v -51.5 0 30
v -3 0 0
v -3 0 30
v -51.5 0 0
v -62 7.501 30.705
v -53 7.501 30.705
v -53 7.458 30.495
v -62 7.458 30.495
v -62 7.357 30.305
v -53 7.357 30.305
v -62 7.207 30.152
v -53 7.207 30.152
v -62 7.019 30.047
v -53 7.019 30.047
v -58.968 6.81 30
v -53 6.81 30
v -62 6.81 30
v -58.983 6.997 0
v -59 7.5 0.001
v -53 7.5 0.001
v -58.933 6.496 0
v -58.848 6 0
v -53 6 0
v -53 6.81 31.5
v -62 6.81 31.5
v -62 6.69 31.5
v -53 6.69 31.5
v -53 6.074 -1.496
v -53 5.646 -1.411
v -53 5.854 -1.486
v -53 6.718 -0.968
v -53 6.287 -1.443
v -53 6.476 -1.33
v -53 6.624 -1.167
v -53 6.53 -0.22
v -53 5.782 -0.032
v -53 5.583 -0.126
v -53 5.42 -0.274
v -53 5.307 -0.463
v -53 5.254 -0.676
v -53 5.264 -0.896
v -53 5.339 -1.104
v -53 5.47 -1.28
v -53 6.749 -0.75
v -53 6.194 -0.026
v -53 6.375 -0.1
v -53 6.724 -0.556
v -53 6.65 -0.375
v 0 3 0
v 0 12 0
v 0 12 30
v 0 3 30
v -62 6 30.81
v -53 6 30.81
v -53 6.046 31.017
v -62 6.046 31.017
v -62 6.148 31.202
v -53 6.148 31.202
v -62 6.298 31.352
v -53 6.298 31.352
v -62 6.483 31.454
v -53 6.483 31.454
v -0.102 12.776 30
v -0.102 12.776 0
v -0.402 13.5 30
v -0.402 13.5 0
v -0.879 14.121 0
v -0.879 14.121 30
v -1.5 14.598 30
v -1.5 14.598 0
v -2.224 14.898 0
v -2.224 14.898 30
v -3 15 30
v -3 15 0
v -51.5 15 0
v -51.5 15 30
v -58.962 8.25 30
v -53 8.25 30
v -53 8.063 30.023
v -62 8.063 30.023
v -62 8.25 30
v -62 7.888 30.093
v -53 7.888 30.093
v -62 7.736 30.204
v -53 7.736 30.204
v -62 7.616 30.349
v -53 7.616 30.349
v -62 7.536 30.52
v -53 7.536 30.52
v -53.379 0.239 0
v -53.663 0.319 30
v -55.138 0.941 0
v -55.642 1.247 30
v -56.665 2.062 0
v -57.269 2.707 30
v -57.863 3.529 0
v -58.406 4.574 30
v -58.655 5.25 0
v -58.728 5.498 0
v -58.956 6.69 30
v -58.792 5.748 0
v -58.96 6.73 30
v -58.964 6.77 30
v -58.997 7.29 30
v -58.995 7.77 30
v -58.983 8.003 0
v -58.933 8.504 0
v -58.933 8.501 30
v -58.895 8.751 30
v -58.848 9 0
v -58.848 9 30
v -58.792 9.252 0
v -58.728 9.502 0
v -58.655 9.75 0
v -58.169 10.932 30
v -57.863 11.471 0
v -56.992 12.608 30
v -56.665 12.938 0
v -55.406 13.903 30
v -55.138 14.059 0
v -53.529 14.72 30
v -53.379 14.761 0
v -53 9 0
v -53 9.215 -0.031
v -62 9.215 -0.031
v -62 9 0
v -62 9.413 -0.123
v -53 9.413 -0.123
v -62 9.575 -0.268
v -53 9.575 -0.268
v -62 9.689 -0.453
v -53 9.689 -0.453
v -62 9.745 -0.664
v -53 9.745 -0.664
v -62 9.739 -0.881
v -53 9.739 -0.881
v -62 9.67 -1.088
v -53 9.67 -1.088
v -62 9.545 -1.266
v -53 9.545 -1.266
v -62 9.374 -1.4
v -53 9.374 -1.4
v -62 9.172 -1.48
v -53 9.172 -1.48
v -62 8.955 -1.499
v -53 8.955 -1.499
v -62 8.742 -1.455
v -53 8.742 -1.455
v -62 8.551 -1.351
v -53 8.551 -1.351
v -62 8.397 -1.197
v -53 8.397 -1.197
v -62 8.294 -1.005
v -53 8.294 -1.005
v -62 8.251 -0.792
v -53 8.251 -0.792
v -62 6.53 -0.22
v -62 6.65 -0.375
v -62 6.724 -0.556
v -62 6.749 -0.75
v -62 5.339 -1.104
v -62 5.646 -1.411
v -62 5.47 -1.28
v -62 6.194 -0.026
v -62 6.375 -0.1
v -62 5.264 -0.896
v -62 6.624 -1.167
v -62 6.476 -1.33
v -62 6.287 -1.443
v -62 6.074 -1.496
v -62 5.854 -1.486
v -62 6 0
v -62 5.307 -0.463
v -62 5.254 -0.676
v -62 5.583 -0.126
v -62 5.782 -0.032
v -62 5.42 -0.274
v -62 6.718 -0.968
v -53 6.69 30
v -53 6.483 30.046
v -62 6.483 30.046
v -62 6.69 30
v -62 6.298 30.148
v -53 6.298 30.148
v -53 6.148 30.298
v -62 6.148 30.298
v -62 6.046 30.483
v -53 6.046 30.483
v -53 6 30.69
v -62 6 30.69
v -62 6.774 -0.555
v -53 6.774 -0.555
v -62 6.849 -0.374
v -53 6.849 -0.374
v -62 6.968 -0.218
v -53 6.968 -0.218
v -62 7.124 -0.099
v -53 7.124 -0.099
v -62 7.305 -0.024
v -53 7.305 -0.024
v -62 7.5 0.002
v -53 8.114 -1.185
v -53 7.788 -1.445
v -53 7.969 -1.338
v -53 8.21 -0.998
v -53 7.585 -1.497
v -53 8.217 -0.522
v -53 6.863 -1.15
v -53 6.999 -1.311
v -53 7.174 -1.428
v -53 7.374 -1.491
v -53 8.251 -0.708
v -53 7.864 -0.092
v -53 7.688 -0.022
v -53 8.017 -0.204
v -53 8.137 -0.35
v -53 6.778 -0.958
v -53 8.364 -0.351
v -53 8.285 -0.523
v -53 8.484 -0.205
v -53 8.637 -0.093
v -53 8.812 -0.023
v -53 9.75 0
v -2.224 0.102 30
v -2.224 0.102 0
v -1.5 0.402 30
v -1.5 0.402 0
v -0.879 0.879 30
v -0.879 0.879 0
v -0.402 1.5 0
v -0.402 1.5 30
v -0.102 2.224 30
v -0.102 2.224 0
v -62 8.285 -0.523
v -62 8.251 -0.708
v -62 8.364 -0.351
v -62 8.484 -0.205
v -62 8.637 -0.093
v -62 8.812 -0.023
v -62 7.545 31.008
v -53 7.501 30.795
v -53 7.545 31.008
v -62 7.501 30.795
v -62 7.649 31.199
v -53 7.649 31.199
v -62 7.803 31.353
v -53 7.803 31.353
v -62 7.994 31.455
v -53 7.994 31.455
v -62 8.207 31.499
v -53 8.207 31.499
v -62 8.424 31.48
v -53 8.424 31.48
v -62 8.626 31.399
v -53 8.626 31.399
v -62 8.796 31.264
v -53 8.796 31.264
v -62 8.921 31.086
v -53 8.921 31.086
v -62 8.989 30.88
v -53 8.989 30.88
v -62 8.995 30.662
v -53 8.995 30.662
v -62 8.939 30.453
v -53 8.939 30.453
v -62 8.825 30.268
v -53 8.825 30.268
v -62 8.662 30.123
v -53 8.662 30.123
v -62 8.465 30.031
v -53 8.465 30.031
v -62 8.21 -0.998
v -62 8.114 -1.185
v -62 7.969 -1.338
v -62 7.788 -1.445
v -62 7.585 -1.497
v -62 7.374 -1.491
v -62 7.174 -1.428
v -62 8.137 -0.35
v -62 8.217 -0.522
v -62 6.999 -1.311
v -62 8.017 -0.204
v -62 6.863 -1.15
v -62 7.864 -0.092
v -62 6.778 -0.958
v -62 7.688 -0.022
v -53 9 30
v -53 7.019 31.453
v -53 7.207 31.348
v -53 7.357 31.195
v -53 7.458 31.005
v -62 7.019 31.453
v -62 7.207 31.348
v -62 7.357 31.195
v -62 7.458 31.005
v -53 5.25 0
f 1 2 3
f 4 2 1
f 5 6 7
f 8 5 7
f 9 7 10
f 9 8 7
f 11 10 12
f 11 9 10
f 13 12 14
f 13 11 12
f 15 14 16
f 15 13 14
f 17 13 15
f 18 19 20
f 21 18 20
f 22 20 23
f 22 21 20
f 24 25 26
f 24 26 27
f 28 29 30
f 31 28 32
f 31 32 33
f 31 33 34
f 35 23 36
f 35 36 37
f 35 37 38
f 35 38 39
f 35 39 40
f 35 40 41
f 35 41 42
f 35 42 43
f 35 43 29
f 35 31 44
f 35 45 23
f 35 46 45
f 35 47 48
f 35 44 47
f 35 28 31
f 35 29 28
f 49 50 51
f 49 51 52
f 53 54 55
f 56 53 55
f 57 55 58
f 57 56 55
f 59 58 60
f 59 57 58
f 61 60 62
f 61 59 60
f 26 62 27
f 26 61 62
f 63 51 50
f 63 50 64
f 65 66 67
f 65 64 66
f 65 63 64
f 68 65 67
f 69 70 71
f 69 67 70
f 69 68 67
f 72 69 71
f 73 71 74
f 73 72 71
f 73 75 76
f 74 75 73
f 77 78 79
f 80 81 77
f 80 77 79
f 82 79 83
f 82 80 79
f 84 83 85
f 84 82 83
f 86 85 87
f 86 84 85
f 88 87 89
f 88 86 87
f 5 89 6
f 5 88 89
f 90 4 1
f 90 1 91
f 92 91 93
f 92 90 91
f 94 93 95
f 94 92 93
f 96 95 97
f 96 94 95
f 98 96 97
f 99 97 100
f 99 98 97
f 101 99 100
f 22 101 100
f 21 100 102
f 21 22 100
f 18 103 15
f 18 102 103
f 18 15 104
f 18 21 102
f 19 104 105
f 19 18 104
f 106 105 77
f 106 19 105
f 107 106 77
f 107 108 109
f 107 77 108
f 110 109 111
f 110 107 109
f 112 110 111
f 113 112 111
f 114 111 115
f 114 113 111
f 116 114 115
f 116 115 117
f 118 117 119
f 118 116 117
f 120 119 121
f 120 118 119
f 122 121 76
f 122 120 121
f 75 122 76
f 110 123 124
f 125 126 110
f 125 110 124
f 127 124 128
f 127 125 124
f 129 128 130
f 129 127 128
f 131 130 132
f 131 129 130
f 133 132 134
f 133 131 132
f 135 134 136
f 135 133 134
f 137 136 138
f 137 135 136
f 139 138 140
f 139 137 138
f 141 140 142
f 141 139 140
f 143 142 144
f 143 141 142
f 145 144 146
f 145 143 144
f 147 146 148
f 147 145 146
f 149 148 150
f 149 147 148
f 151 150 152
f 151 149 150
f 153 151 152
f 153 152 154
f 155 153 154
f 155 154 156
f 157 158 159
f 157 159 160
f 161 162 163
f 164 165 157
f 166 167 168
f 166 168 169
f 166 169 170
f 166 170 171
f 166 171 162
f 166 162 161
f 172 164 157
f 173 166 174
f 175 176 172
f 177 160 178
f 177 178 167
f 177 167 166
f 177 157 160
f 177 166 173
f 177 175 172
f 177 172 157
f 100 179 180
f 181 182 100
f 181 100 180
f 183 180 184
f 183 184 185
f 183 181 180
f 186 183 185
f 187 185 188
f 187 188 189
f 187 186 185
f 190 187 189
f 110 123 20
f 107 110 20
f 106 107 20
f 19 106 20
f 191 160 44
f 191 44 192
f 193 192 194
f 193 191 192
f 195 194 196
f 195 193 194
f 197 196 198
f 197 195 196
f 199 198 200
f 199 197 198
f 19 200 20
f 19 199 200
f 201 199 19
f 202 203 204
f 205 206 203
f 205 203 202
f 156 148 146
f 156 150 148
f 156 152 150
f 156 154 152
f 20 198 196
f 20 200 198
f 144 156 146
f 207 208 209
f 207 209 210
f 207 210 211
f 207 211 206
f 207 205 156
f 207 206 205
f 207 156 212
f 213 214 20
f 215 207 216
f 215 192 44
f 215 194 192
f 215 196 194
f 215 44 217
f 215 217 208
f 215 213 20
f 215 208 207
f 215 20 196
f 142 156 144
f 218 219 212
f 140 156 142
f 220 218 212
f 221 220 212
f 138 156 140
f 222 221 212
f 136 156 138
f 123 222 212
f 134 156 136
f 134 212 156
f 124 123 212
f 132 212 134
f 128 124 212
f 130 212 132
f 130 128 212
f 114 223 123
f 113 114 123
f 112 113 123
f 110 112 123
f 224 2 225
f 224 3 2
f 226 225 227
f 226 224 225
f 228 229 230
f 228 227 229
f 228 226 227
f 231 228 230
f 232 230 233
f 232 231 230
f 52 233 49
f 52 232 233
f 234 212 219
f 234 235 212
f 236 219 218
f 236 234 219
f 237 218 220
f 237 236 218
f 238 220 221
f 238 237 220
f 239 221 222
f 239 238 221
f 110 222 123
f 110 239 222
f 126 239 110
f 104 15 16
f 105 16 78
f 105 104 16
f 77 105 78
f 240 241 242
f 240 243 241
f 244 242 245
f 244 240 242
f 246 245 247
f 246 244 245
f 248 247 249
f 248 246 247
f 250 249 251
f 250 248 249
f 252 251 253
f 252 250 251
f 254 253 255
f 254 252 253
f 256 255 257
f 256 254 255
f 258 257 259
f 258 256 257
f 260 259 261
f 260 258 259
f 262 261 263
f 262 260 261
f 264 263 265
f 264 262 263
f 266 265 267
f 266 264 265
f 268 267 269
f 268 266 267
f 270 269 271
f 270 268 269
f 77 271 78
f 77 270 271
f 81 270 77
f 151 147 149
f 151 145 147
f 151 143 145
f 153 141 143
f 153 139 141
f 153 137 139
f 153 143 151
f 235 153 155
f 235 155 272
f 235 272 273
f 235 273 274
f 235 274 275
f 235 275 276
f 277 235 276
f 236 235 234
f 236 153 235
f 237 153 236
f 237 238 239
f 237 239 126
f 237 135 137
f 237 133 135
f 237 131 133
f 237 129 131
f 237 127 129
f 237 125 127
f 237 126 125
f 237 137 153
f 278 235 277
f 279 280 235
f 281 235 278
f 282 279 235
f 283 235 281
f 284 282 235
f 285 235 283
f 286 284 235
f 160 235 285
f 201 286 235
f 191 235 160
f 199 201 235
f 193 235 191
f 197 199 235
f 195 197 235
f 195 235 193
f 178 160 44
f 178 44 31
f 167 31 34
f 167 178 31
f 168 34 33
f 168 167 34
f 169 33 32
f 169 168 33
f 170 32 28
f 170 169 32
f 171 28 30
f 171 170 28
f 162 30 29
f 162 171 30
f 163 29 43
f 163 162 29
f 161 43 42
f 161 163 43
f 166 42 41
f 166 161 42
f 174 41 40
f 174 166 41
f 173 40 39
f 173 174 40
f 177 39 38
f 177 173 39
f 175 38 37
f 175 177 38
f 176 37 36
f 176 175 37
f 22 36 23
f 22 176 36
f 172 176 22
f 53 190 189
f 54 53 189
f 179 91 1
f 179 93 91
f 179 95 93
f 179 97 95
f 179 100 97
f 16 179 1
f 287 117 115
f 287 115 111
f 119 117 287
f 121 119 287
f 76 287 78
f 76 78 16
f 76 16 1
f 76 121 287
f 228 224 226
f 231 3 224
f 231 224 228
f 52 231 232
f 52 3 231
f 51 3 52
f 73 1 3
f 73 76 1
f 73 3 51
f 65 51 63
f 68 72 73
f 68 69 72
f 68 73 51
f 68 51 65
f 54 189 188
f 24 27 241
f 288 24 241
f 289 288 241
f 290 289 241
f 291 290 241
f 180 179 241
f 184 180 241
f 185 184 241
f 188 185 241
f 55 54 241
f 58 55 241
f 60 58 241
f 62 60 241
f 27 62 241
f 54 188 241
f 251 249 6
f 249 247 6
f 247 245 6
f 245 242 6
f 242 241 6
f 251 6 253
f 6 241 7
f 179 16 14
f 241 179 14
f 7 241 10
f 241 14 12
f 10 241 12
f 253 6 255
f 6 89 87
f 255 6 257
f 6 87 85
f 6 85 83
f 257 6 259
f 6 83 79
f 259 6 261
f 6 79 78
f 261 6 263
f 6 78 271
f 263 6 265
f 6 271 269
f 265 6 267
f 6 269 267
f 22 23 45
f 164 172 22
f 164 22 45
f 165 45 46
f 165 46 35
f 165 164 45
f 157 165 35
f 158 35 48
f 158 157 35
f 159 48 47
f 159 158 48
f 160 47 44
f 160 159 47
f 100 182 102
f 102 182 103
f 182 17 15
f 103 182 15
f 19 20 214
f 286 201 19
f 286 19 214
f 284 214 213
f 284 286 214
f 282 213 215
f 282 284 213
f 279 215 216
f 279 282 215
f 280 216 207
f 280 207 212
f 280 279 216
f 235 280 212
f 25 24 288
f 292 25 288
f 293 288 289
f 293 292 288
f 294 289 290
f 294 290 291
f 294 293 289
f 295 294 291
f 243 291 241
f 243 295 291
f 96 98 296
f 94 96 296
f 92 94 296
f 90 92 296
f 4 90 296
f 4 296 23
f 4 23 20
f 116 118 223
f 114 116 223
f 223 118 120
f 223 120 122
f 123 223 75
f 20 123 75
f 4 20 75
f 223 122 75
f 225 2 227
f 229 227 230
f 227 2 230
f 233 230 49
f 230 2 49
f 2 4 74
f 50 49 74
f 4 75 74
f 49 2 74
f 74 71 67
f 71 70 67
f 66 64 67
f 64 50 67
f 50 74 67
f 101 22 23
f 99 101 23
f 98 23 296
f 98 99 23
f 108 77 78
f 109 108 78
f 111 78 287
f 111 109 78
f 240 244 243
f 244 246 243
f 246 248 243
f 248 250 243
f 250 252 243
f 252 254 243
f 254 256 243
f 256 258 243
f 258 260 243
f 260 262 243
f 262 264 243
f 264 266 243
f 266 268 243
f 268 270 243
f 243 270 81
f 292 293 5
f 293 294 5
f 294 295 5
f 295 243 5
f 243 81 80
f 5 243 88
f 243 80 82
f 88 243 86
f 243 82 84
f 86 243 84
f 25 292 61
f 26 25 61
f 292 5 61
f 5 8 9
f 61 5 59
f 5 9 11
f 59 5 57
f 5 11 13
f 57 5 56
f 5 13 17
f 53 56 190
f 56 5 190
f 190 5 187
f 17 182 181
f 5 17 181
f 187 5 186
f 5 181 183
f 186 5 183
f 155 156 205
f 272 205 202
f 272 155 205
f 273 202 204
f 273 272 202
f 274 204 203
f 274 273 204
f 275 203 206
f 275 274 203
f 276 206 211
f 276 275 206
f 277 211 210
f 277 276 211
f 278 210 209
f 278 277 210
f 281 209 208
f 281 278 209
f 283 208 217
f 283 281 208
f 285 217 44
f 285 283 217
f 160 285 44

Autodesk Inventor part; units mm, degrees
ref_plane "YZ Plane" through (0, 0, 0) normal (1, 0, 0) x (0, 1, 0)
ref_plane "XZ Plane" through (0, 0, 0) normal (0, 1, 0) x (-1, 0, 0)
ref_plane "XY Plane" through (0, 0, 0) normal (0, 0, 1) x (1, 0, 0)
sketch "Sketch2" plane through (0, 0, 0) normal (0, 0, 1) x (1, 0, 0)
  line L0 (-51.5, 15) -> (0, 15)
  line L1 (0, 15) -> (0, 0)
  line L2 (0, 0) -> (-51.5, 0)
  line L3 (-51.5, 0) -> (-51.5, 15)
  circle A0 centre (-51.5, 7.5) radius 7.5
  dimension "d0" = 15
  dimension "d1" = 0
  dimension "d2" = 51.5
  dimension "d3" = 0
extrude "Extrusion1" add sketch "Sketch2" along normal blind 30
sketch "Sketch3" plane through (0, 0, 30) normal (0, 0, 1) x (1, 0, 0)
  line L0 (-53, 9) -> (-62, 9)
  line L1 (-62, 9) -> (-62, 6)
  line L2 (-62, 6) -> (-53, 6)
  line L3 (-53, 6) -> (-53, 9)
  line L4 (-51.5, 0) -> (0, 0) projected
  line L5 (0, 0) -> (0, 15) projected
  arc A0 (-51.5, 15) -> (-51.5, 0) centre (-51.5, 7.5) ccw projected
  dimension "d6" = 3
  dimension "d7" = 6
  dimension "d8" = 53
  dimension "d9" = 10.5
extrude "Extrusion2" add sketch "Sketch3" along normal blind 1.5
sketch "Sketch4" plane through (-62, 6, 30) normal (-1, 0, 0) x (0, 0, 1)
  circle A0 centre (0.75, 2.25) radius 0.7503
  circle A1 centre (0.75, 0.75) radius 0.7524
  line L0 (0, 3) -> (1.5, 3) projected
  line L1 (0, 0) -> (1.5, 0) projected
  line L2 (0, 3) -> (0, 9) projected
  line L3 (1.5, 3) -> (1.5, 0) projected
  line L4 (0, 3) -> (1.5, 3)
  line L5 (1.5, 3) -> (1.5, 0)
  line L6 (1.5, 0) -> (0, 0)
  line L7 (0, 0) -> (0, 3)
  point P0 (-30, -6)
  point P1 (1.5, 2.2724)
  point P2 (0.7724, 3)
  point P3 (0, 2.2276)
  point P4 (0, 0.8104)
  point P5 (0.7045, 1.501)
  point P6 (0, 2.2724)
  point P7 (0.7276, 3)
  point P8 (1.5, 0.8104)
  point P9 (1.5, 2.2276)
  point P10 (0.7955, 1.501)
  point P11 (1.5, 0.6896)
  point P12 (0.8104, 0)
  point P13 (0, 0.6896)
  point P14 (0.6896, 0)
  dimension "d12" = 0.75
  dimension "d13" = 0.75
extrude "Extrusion3" cut sketch "Sketch4" against normal through all contours L3 A1 A0 | A0 L0 L3 | A0 L7 L0 | A0 A1 L7 | L3 L1 A1 | A1 L1 L7 picked at (1.3379, 1.4108)
sketch "Sketch5" plane through (0, 0, 0) normal (0, 0, -1) x (-1, 0, 0)
  line L0 (53, 9.75) -> (62, 9.75)
  line L1 (62, 9.75) -> (62, 5.25)
  line L2 (62, 5.25) -> (53, 5.25)
  line L3 (53, 5.25) -> (53, 9.75)
  line L4 (0, 0) -> (0, 15) projected
  line L5 (51.5, 0) -> (0, 0) projected
  line L6 (62, 6.8104) -> (62, 7.501) projected
  dimension "d16" = 4.5
  dimension "d17" = 53
  dimension "d18" = 5.25
  dimension "d19" = 0
extrude "Extrusion4" add sketch "Sketch5" along normal blind 1.5
sketch "Sketch6" plane through (-62, 5.25, 0) normal (-1, 0, 0) x (0, 0, 1)
  circle A0 centre (-0.75, 3.75) radius 0.7504
  circle A1 centre (-0.75, 2.25) radius 0.7519
  circle A2 centre (-0.75, 0.75) radius 0.75
  line L0 (-1.5, 4.5) -> (-1.5, 0) projected
  line L1 (0, 4.5) -> (-1.5, 4.5) projected
  line L2 (-1.5, 4.5) -> (0, 4.5)
  line L3 (0, 4.5) -> (0, 0)
  line L4 (0, 0) -> (-1.5, 0)
  line L5 (-1.5, 0) -> (-1.5, 4.5)
  point P0 (0, -5.25)
  point P1 (-1.5, 3.7258)
  point P2 (-1.5, 2.304)
  point P3 (-0.7918, 3.0008)
  point P4 (-0.7742, 4.5)
  point P5 (-1.5, 3.7742)
  point P6 (0, 3.7742)
  point P7 (-0.7258, 4.5)
  point P8 (0, 2.304)
  point P9 (0, 3.7258)
  point P10 (-0.7082, 3.0008)
  point P11 (-0.75, 0)
  point P12 (0, 0.75)
  point P13 (-1.5, 0.75)
  point P14 (0, 2.196)
  point P15 (-0.7118, 1.499)
  point P16 (-1.5, 2.196)
  point P17 (-0.7882, 1.499)
  dimension "d22" = 1.5
  dimension "d23" = 0.75
  dimension "d24" = 0.75
  dimension "d25" = 1.5
extrude "Extrusion5" cut sketch "Sketch6" against normal through all contours L3 A1 A0 | A0 L1 L3 | A0 L0 L1 | L3 A2 A1 | A0 A1 L0 | A2 L0 A1 | L3 L4 A2 | A2 L4 L0
fillet "Fillet1" radius 3 2 edges at (0, 15, 15) (0, 0, 15)
properties part number "Battery_temp"
